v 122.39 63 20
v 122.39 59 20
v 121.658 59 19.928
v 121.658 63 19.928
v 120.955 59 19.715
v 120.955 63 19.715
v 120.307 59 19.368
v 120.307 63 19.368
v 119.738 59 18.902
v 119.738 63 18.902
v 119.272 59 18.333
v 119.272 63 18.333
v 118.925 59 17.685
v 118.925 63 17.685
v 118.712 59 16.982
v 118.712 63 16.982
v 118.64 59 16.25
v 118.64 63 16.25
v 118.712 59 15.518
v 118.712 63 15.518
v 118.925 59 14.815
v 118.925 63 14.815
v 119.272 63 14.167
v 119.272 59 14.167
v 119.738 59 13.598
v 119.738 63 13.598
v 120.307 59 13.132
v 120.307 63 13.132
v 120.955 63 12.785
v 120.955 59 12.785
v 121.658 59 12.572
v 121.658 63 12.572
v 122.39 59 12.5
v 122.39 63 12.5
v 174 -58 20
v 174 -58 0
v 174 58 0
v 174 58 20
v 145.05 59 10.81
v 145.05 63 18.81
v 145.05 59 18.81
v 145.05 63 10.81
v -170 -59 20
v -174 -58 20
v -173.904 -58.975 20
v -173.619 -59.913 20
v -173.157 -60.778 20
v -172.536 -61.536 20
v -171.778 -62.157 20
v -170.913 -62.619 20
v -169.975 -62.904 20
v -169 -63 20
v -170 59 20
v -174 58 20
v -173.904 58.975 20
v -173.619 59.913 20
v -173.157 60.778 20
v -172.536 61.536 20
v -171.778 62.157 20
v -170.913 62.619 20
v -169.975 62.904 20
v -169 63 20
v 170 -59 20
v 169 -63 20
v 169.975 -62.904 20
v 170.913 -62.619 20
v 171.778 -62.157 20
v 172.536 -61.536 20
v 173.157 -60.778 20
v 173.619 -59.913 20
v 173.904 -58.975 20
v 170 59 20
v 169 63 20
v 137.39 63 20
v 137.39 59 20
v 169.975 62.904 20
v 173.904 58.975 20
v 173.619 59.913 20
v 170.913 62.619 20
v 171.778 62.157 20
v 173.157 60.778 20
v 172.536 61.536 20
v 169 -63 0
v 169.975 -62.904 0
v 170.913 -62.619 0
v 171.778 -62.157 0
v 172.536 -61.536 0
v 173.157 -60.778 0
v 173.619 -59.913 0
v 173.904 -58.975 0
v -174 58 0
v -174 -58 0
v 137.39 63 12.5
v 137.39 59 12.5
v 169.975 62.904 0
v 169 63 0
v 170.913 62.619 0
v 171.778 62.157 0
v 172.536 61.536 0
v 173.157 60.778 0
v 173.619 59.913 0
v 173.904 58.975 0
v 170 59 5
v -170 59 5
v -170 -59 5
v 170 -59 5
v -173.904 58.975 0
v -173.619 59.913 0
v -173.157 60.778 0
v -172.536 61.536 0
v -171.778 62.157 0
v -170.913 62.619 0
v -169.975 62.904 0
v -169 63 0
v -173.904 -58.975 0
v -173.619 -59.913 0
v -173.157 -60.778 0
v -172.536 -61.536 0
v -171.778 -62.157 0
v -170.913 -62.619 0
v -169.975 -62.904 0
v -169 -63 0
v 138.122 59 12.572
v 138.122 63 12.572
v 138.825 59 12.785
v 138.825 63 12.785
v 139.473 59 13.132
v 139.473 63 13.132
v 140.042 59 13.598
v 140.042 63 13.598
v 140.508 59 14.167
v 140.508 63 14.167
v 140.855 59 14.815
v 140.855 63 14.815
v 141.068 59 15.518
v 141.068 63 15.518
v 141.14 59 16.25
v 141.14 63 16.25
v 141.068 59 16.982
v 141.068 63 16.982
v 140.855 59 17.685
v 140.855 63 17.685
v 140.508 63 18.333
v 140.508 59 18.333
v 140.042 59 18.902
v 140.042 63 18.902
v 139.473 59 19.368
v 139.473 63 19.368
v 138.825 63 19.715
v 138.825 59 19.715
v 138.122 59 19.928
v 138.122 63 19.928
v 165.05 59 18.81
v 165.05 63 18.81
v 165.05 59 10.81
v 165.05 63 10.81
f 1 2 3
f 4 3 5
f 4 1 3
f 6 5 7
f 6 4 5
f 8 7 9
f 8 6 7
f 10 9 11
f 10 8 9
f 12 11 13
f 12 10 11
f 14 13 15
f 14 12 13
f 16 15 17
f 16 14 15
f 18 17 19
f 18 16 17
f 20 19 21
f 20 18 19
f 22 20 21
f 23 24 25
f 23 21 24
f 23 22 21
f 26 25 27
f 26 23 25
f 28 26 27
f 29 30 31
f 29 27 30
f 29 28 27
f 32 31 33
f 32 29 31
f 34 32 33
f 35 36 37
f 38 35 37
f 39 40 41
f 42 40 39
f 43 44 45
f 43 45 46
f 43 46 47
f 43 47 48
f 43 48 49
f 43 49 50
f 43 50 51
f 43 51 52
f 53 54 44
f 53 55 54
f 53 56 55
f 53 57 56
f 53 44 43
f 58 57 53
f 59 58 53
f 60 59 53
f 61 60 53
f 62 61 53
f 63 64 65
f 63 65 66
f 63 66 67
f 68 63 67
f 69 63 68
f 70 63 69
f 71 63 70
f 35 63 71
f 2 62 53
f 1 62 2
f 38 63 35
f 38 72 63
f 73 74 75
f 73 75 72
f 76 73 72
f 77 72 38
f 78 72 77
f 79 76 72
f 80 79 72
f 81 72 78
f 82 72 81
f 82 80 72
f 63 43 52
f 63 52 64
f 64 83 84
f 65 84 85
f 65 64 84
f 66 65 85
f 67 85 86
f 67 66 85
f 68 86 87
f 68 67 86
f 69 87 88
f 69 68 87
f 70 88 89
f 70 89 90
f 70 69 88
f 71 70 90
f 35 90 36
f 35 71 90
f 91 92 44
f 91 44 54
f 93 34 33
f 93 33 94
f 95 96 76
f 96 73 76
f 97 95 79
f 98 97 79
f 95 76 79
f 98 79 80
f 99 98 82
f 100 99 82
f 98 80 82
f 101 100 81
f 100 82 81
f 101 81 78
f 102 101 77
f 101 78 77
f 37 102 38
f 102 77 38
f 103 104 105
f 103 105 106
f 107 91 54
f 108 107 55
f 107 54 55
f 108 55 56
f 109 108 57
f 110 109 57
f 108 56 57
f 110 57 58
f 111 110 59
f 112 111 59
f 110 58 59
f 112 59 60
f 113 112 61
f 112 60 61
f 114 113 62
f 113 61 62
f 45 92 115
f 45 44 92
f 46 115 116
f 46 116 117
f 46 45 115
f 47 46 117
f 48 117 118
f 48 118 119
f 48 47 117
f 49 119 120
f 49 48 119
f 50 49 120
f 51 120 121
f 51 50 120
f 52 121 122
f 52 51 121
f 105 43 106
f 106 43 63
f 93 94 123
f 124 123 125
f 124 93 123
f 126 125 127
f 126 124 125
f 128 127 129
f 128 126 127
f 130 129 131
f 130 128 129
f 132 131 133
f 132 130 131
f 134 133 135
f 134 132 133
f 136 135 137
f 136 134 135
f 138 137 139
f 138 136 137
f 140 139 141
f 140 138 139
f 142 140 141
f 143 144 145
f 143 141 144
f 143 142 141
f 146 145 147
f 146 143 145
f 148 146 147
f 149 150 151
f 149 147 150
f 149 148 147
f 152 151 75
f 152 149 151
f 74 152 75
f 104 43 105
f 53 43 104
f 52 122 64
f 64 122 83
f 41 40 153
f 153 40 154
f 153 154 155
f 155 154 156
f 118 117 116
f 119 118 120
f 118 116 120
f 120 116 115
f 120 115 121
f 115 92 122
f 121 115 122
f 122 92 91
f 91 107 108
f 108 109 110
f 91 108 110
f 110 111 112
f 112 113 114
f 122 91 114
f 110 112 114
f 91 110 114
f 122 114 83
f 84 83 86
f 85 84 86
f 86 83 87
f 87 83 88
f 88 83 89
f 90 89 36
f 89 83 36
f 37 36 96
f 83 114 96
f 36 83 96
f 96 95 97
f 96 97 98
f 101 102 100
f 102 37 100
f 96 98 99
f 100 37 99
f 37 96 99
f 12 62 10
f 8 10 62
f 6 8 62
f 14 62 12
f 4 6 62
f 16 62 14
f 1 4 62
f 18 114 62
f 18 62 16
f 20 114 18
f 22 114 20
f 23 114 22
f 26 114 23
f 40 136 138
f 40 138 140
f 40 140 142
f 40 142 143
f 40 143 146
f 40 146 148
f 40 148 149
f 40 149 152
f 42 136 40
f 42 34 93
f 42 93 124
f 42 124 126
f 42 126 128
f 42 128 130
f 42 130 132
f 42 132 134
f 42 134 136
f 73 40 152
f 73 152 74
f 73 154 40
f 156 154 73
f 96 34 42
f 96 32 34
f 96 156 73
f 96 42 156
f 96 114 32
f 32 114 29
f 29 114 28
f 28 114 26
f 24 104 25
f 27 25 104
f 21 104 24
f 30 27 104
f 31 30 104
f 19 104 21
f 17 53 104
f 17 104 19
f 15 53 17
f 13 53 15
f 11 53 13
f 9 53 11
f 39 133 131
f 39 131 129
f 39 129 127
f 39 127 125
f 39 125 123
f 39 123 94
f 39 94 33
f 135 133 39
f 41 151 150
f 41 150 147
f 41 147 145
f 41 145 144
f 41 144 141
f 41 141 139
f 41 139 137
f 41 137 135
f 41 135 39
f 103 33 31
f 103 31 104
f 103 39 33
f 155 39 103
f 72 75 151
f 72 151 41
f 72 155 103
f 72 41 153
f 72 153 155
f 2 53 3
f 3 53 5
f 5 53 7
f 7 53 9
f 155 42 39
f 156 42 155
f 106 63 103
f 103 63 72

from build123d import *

# Parameters (mm, degrees)
SKETCH1_W           = 348
SKETCH1_H           = 126
BOSS_EXTRUDE1_DEPTH = 20
SKETCH2_W           = 340
SKETCH2_H           = 118
CUT_EXTRUDE1_DEPTH  = 15
CUT_EXTRUDE2_REACH  = 217.759
CUT_EXTRUDE3_REACH  = 217.759
SKETCH5_W           = 20
SKETCH5_H           = 8
FILLET1_R           = 5


with BuildPart() as part:
    # Sketch1 → Boss-Extrude1 (new body)
    with BuildSketch(Plane.XY):
        Rectangle(SKETCH1_W, SKETCH1_H)
    extrude(amount=BOSS_EXTRUDE1_DEPTH)

    # Sketch2 → Cut-Extrude1 (cut)
    with BuildSketch(Plane.XY.offset(20)):
        Rectangle(SKETCH2_W, SKETCH2_H)
    extrude(amount=-CUT_EXTRUDE1_DEPTH, mode=Mode.SUBTRACT)

    # Sketch4 → Cut-Extrude2 (cut, up to next)
    with BuildSketch(Plane(origin=(0, 63, 0), x_dir=(1, 0, 0), z_dir=(0, 1, 0)), mode=Mode.PRIVATE) as cut_extrude2_sk1:
        with BuildLine():
            Line((122.39, -12.5), (137.39, -12.5))
            ThreePointArc((137.39, -12.5), (141.14, -16.25), (137.39, -20))
            Line((137.39, -20), (122.39, -20))
            ThreePointArc((122.39, -20), (118.64, -16.25), (122.39, -12.5))
        make_face()
    cut_extrude2_tool1 = extrude(cut_extrude2_sk1.sketch, amount=-CUT_EXTRUDE2_REACH, mode=Mode.PRIVATE) & part.part
    add(cut_extrude2_tool1.solids().sort_by_distance((129.89, 63, 16.25))[0], mode=Mode.SUBTRACT)

    # Sketch5 → Cut-Extrude3 (cut, up to next)
    with BuildSketch(Plane(origin=(0, 63, 0), x_dir=(1, 0, 0), z_dir=(0, 1, 0)), mode=Mode.PRIVATE) as cut_extrude3_sk1:
        with Locations((155.05, -14.81)):
            Rectangle(SKETCH5_W, SKETCH5_H)
    cut_extrude3_tool1 = extrude(cut_extrude3_sk1.sketch, amount=-CUT_EXTRUDE3_REACH, mode=Mode.PRIVATE) & part.part
    add(cut_extrude3_tool1.solids().sort_by_distance((155.05, 63, 14.81))[0], mode=Mode.SUBTRACT)

    # Fillet1
    fillet1_edges = [part.edges().sort_by_distance(p)[0] for p in [
        (-174, 63, 10),
        (174, 63, 10),
        (174, -63, 10),
        (-174, -63, 10),
    ]]
    fillet(fillet1_edges, radius=FILLET1_R)


solid = part.part
